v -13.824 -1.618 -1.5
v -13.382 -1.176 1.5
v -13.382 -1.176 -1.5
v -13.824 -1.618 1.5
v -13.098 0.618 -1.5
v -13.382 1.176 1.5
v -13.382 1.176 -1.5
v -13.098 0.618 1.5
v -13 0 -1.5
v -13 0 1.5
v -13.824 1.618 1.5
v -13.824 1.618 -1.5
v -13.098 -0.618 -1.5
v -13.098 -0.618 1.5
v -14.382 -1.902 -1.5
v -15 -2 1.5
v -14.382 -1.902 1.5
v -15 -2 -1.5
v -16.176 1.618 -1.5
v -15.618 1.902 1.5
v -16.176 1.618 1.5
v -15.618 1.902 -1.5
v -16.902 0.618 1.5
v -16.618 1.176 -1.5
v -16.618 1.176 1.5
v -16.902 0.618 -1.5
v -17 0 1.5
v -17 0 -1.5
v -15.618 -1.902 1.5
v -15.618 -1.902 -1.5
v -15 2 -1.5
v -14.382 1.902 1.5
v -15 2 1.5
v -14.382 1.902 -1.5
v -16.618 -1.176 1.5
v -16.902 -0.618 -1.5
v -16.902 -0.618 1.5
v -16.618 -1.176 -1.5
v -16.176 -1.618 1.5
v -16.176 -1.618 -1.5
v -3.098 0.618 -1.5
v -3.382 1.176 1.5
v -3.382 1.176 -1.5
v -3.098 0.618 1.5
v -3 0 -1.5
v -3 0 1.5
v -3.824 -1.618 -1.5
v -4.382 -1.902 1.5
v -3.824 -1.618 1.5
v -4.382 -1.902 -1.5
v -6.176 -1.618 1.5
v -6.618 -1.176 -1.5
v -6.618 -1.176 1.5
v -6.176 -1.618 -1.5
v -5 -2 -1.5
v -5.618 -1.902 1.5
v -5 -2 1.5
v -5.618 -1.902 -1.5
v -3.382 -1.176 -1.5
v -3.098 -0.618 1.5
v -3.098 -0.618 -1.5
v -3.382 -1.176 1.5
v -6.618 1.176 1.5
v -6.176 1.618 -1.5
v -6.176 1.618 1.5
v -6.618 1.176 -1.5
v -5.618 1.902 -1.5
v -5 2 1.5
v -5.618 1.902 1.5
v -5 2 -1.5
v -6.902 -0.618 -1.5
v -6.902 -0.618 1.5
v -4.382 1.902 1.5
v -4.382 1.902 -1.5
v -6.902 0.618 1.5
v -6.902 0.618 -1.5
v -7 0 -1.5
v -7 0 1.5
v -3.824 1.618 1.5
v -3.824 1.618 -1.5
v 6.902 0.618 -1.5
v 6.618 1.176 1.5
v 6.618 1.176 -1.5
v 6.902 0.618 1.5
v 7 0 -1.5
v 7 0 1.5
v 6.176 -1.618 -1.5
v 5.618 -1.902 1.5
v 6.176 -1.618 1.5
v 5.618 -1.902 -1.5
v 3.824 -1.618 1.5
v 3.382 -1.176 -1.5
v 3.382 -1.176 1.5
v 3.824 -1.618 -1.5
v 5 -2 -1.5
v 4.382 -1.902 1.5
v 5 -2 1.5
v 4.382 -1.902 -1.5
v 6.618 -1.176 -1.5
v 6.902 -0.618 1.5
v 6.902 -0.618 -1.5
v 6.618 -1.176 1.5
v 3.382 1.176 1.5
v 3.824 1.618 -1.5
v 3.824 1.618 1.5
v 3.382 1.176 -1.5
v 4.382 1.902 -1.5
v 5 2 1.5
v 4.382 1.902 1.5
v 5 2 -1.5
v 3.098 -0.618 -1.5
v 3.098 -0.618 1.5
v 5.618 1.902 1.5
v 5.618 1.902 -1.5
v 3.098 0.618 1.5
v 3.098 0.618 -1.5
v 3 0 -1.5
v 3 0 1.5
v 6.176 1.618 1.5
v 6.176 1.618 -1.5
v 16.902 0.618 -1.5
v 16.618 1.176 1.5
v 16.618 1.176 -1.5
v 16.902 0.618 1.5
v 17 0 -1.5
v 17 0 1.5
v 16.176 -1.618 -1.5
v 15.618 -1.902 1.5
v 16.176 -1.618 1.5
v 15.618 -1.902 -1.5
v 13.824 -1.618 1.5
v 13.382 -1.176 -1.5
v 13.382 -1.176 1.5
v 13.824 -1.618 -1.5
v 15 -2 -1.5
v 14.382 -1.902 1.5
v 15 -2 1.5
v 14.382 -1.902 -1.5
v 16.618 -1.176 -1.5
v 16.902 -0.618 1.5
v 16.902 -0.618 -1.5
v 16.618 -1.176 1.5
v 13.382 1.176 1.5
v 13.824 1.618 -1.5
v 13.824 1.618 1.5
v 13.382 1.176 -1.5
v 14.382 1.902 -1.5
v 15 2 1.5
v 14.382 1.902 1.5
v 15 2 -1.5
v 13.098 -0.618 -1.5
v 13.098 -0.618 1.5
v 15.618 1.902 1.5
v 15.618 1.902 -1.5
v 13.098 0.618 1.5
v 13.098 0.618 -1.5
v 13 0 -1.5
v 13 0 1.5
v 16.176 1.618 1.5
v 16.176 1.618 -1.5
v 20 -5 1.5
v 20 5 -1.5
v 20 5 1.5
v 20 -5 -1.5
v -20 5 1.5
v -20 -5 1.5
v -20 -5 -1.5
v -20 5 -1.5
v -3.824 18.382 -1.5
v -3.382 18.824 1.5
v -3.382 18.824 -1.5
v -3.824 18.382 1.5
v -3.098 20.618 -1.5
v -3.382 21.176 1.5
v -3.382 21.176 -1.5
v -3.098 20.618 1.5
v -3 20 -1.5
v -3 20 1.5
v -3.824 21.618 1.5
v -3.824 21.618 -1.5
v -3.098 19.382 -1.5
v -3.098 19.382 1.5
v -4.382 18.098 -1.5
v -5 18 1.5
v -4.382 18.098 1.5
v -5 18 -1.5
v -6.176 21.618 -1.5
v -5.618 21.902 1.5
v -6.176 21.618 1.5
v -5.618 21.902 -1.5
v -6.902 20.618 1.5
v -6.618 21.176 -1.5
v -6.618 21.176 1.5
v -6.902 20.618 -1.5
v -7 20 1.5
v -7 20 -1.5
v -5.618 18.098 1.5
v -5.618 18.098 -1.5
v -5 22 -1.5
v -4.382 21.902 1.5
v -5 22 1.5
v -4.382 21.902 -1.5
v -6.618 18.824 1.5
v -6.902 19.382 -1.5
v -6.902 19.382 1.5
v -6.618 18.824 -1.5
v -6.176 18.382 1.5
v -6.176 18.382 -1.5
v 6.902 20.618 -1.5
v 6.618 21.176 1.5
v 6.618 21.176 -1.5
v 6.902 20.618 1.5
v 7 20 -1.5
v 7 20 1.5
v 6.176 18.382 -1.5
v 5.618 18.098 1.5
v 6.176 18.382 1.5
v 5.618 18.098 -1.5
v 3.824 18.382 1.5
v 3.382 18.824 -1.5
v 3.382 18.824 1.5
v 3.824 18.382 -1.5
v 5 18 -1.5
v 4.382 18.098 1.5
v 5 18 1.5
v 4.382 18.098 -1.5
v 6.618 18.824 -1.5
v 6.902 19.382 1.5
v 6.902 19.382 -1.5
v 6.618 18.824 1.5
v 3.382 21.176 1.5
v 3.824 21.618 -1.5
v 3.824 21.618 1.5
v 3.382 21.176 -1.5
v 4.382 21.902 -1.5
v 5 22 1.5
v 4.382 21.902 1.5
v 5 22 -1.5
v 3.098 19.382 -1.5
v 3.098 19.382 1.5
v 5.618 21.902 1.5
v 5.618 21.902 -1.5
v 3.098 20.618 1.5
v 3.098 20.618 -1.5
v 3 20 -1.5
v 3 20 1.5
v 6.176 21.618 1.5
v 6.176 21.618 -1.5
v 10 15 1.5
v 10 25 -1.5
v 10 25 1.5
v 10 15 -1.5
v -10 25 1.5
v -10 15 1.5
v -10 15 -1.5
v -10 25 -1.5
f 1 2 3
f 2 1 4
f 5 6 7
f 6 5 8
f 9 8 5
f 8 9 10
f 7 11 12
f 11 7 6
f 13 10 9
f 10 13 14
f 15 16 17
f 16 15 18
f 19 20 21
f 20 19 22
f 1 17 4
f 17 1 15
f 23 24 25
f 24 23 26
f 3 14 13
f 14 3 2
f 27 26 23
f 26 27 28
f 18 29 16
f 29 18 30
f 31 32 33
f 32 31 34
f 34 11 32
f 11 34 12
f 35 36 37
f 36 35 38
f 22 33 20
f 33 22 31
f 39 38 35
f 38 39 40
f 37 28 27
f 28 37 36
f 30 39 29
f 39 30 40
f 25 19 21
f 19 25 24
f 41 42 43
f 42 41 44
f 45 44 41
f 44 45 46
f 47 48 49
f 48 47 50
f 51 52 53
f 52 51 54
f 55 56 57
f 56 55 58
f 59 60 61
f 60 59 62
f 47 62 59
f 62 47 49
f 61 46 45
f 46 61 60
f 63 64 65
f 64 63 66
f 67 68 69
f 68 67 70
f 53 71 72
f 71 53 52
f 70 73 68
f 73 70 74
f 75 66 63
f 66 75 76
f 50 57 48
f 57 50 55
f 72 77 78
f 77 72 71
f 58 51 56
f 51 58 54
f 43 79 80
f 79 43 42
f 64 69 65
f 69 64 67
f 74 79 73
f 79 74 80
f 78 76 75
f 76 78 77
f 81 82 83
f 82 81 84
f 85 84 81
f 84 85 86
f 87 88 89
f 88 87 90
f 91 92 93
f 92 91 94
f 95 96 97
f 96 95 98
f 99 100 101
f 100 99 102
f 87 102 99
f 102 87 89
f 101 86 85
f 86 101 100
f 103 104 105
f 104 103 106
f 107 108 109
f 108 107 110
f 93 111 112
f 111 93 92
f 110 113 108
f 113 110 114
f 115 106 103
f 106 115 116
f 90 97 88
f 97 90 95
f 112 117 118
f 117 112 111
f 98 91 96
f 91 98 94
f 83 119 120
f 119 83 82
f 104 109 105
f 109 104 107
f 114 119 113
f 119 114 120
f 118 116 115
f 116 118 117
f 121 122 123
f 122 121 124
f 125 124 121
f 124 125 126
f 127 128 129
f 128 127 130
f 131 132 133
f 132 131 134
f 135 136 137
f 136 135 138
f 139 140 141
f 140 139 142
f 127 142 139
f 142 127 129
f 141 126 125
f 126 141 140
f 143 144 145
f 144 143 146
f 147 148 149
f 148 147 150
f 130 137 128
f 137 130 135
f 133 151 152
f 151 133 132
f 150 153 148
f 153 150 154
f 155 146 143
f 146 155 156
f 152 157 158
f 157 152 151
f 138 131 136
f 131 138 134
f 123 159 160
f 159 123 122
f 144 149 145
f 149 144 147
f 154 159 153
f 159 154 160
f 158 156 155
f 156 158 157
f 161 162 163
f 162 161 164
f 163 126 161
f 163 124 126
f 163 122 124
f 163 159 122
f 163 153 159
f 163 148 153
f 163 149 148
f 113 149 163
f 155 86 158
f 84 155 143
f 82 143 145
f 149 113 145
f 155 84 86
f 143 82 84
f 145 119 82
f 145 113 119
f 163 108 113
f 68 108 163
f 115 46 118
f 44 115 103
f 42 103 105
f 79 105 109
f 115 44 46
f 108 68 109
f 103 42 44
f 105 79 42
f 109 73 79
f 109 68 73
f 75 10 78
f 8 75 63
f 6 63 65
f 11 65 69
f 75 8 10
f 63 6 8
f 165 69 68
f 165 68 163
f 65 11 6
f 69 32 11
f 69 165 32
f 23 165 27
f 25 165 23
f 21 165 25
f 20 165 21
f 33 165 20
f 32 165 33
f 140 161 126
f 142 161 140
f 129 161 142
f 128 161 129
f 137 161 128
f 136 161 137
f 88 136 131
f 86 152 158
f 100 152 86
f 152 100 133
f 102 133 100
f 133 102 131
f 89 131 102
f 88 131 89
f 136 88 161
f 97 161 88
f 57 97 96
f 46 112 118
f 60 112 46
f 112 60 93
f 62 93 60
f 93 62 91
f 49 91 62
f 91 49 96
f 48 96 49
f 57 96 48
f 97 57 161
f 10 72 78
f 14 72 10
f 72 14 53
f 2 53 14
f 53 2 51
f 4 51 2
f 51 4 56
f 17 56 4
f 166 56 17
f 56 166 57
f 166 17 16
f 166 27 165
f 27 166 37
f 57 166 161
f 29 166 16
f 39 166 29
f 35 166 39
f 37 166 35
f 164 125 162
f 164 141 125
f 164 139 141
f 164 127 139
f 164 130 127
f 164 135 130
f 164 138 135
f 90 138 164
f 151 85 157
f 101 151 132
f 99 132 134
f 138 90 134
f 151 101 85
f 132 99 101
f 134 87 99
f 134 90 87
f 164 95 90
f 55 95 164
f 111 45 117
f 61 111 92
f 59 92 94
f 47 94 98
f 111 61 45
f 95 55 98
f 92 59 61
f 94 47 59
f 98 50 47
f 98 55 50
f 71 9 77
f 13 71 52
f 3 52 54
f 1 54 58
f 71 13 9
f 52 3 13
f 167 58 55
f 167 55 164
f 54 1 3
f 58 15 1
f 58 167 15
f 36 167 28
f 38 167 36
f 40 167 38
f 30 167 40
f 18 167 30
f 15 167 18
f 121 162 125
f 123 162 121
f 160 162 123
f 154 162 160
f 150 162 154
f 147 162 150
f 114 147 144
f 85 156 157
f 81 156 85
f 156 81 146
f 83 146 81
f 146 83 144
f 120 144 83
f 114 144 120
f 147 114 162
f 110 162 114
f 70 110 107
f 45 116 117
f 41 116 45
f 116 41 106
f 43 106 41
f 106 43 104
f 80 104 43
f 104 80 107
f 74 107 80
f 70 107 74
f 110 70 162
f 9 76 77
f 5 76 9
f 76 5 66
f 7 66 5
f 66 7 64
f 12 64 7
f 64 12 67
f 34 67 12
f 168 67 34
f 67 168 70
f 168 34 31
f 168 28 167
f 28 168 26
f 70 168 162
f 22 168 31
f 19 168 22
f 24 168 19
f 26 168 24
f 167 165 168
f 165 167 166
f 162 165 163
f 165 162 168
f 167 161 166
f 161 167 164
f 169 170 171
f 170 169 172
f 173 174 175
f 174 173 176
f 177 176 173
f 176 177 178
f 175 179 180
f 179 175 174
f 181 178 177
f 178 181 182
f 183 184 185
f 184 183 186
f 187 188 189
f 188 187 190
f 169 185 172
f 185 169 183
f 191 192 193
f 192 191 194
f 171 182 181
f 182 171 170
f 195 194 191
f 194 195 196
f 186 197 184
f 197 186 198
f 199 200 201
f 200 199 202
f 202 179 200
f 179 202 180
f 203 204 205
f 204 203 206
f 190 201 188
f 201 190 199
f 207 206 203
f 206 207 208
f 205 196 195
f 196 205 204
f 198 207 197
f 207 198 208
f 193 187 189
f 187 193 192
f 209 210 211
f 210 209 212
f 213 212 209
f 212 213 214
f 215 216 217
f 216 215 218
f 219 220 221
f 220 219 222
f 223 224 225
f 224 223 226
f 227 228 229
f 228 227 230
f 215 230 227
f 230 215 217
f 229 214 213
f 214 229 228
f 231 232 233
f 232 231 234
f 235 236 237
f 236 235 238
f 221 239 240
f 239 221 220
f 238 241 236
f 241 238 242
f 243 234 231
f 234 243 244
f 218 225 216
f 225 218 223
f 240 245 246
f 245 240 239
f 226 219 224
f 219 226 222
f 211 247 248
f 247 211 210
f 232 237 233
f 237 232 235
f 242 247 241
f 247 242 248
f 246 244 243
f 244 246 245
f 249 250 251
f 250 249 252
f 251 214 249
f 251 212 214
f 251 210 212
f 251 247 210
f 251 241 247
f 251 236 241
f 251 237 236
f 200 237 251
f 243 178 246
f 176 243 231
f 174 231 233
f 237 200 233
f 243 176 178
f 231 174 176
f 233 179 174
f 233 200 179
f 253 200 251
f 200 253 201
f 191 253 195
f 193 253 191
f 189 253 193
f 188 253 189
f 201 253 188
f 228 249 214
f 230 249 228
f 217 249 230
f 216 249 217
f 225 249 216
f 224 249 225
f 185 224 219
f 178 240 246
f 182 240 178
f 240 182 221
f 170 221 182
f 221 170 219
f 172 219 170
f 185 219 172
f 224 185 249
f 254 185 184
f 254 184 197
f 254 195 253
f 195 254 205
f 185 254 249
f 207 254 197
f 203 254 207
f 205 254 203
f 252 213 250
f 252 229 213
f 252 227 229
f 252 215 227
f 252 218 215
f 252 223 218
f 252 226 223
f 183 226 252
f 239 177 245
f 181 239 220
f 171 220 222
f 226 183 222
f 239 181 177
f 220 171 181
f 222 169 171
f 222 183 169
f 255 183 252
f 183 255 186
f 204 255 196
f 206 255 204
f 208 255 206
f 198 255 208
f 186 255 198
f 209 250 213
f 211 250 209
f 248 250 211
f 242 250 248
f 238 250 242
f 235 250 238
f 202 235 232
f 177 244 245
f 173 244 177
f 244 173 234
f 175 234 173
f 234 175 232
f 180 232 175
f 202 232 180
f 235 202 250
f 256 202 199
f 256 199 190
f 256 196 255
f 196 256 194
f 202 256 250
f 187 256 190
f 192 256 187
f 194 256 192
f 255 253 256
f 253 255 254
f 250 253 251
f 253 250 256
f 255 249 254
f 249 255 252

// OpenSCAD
module pieza_mecano(n=4,drill=4,d=10,anchura=10,grosor=3){
    //-- Calcular longitud pieza
    lx=n*d;
    
    //-- Construir la pieza
    difference(){
        //-- Cuerpo de la pieza
        cube([lx,anchura,grosor],center=true);
        
        //-- Taladros
        translate([-lx/2+d/2,0,0])
            for(i=[0:n-1]){
                translate([i*d,0,0])
                    cylinder(r=drill/2,h=grosor+5,$fn=20,center=true);
            }
    }
}

//-- Ejemplos de utilización
pieza_mecano();

translate([0,20,0])
    pieza_mecano(n=2);
